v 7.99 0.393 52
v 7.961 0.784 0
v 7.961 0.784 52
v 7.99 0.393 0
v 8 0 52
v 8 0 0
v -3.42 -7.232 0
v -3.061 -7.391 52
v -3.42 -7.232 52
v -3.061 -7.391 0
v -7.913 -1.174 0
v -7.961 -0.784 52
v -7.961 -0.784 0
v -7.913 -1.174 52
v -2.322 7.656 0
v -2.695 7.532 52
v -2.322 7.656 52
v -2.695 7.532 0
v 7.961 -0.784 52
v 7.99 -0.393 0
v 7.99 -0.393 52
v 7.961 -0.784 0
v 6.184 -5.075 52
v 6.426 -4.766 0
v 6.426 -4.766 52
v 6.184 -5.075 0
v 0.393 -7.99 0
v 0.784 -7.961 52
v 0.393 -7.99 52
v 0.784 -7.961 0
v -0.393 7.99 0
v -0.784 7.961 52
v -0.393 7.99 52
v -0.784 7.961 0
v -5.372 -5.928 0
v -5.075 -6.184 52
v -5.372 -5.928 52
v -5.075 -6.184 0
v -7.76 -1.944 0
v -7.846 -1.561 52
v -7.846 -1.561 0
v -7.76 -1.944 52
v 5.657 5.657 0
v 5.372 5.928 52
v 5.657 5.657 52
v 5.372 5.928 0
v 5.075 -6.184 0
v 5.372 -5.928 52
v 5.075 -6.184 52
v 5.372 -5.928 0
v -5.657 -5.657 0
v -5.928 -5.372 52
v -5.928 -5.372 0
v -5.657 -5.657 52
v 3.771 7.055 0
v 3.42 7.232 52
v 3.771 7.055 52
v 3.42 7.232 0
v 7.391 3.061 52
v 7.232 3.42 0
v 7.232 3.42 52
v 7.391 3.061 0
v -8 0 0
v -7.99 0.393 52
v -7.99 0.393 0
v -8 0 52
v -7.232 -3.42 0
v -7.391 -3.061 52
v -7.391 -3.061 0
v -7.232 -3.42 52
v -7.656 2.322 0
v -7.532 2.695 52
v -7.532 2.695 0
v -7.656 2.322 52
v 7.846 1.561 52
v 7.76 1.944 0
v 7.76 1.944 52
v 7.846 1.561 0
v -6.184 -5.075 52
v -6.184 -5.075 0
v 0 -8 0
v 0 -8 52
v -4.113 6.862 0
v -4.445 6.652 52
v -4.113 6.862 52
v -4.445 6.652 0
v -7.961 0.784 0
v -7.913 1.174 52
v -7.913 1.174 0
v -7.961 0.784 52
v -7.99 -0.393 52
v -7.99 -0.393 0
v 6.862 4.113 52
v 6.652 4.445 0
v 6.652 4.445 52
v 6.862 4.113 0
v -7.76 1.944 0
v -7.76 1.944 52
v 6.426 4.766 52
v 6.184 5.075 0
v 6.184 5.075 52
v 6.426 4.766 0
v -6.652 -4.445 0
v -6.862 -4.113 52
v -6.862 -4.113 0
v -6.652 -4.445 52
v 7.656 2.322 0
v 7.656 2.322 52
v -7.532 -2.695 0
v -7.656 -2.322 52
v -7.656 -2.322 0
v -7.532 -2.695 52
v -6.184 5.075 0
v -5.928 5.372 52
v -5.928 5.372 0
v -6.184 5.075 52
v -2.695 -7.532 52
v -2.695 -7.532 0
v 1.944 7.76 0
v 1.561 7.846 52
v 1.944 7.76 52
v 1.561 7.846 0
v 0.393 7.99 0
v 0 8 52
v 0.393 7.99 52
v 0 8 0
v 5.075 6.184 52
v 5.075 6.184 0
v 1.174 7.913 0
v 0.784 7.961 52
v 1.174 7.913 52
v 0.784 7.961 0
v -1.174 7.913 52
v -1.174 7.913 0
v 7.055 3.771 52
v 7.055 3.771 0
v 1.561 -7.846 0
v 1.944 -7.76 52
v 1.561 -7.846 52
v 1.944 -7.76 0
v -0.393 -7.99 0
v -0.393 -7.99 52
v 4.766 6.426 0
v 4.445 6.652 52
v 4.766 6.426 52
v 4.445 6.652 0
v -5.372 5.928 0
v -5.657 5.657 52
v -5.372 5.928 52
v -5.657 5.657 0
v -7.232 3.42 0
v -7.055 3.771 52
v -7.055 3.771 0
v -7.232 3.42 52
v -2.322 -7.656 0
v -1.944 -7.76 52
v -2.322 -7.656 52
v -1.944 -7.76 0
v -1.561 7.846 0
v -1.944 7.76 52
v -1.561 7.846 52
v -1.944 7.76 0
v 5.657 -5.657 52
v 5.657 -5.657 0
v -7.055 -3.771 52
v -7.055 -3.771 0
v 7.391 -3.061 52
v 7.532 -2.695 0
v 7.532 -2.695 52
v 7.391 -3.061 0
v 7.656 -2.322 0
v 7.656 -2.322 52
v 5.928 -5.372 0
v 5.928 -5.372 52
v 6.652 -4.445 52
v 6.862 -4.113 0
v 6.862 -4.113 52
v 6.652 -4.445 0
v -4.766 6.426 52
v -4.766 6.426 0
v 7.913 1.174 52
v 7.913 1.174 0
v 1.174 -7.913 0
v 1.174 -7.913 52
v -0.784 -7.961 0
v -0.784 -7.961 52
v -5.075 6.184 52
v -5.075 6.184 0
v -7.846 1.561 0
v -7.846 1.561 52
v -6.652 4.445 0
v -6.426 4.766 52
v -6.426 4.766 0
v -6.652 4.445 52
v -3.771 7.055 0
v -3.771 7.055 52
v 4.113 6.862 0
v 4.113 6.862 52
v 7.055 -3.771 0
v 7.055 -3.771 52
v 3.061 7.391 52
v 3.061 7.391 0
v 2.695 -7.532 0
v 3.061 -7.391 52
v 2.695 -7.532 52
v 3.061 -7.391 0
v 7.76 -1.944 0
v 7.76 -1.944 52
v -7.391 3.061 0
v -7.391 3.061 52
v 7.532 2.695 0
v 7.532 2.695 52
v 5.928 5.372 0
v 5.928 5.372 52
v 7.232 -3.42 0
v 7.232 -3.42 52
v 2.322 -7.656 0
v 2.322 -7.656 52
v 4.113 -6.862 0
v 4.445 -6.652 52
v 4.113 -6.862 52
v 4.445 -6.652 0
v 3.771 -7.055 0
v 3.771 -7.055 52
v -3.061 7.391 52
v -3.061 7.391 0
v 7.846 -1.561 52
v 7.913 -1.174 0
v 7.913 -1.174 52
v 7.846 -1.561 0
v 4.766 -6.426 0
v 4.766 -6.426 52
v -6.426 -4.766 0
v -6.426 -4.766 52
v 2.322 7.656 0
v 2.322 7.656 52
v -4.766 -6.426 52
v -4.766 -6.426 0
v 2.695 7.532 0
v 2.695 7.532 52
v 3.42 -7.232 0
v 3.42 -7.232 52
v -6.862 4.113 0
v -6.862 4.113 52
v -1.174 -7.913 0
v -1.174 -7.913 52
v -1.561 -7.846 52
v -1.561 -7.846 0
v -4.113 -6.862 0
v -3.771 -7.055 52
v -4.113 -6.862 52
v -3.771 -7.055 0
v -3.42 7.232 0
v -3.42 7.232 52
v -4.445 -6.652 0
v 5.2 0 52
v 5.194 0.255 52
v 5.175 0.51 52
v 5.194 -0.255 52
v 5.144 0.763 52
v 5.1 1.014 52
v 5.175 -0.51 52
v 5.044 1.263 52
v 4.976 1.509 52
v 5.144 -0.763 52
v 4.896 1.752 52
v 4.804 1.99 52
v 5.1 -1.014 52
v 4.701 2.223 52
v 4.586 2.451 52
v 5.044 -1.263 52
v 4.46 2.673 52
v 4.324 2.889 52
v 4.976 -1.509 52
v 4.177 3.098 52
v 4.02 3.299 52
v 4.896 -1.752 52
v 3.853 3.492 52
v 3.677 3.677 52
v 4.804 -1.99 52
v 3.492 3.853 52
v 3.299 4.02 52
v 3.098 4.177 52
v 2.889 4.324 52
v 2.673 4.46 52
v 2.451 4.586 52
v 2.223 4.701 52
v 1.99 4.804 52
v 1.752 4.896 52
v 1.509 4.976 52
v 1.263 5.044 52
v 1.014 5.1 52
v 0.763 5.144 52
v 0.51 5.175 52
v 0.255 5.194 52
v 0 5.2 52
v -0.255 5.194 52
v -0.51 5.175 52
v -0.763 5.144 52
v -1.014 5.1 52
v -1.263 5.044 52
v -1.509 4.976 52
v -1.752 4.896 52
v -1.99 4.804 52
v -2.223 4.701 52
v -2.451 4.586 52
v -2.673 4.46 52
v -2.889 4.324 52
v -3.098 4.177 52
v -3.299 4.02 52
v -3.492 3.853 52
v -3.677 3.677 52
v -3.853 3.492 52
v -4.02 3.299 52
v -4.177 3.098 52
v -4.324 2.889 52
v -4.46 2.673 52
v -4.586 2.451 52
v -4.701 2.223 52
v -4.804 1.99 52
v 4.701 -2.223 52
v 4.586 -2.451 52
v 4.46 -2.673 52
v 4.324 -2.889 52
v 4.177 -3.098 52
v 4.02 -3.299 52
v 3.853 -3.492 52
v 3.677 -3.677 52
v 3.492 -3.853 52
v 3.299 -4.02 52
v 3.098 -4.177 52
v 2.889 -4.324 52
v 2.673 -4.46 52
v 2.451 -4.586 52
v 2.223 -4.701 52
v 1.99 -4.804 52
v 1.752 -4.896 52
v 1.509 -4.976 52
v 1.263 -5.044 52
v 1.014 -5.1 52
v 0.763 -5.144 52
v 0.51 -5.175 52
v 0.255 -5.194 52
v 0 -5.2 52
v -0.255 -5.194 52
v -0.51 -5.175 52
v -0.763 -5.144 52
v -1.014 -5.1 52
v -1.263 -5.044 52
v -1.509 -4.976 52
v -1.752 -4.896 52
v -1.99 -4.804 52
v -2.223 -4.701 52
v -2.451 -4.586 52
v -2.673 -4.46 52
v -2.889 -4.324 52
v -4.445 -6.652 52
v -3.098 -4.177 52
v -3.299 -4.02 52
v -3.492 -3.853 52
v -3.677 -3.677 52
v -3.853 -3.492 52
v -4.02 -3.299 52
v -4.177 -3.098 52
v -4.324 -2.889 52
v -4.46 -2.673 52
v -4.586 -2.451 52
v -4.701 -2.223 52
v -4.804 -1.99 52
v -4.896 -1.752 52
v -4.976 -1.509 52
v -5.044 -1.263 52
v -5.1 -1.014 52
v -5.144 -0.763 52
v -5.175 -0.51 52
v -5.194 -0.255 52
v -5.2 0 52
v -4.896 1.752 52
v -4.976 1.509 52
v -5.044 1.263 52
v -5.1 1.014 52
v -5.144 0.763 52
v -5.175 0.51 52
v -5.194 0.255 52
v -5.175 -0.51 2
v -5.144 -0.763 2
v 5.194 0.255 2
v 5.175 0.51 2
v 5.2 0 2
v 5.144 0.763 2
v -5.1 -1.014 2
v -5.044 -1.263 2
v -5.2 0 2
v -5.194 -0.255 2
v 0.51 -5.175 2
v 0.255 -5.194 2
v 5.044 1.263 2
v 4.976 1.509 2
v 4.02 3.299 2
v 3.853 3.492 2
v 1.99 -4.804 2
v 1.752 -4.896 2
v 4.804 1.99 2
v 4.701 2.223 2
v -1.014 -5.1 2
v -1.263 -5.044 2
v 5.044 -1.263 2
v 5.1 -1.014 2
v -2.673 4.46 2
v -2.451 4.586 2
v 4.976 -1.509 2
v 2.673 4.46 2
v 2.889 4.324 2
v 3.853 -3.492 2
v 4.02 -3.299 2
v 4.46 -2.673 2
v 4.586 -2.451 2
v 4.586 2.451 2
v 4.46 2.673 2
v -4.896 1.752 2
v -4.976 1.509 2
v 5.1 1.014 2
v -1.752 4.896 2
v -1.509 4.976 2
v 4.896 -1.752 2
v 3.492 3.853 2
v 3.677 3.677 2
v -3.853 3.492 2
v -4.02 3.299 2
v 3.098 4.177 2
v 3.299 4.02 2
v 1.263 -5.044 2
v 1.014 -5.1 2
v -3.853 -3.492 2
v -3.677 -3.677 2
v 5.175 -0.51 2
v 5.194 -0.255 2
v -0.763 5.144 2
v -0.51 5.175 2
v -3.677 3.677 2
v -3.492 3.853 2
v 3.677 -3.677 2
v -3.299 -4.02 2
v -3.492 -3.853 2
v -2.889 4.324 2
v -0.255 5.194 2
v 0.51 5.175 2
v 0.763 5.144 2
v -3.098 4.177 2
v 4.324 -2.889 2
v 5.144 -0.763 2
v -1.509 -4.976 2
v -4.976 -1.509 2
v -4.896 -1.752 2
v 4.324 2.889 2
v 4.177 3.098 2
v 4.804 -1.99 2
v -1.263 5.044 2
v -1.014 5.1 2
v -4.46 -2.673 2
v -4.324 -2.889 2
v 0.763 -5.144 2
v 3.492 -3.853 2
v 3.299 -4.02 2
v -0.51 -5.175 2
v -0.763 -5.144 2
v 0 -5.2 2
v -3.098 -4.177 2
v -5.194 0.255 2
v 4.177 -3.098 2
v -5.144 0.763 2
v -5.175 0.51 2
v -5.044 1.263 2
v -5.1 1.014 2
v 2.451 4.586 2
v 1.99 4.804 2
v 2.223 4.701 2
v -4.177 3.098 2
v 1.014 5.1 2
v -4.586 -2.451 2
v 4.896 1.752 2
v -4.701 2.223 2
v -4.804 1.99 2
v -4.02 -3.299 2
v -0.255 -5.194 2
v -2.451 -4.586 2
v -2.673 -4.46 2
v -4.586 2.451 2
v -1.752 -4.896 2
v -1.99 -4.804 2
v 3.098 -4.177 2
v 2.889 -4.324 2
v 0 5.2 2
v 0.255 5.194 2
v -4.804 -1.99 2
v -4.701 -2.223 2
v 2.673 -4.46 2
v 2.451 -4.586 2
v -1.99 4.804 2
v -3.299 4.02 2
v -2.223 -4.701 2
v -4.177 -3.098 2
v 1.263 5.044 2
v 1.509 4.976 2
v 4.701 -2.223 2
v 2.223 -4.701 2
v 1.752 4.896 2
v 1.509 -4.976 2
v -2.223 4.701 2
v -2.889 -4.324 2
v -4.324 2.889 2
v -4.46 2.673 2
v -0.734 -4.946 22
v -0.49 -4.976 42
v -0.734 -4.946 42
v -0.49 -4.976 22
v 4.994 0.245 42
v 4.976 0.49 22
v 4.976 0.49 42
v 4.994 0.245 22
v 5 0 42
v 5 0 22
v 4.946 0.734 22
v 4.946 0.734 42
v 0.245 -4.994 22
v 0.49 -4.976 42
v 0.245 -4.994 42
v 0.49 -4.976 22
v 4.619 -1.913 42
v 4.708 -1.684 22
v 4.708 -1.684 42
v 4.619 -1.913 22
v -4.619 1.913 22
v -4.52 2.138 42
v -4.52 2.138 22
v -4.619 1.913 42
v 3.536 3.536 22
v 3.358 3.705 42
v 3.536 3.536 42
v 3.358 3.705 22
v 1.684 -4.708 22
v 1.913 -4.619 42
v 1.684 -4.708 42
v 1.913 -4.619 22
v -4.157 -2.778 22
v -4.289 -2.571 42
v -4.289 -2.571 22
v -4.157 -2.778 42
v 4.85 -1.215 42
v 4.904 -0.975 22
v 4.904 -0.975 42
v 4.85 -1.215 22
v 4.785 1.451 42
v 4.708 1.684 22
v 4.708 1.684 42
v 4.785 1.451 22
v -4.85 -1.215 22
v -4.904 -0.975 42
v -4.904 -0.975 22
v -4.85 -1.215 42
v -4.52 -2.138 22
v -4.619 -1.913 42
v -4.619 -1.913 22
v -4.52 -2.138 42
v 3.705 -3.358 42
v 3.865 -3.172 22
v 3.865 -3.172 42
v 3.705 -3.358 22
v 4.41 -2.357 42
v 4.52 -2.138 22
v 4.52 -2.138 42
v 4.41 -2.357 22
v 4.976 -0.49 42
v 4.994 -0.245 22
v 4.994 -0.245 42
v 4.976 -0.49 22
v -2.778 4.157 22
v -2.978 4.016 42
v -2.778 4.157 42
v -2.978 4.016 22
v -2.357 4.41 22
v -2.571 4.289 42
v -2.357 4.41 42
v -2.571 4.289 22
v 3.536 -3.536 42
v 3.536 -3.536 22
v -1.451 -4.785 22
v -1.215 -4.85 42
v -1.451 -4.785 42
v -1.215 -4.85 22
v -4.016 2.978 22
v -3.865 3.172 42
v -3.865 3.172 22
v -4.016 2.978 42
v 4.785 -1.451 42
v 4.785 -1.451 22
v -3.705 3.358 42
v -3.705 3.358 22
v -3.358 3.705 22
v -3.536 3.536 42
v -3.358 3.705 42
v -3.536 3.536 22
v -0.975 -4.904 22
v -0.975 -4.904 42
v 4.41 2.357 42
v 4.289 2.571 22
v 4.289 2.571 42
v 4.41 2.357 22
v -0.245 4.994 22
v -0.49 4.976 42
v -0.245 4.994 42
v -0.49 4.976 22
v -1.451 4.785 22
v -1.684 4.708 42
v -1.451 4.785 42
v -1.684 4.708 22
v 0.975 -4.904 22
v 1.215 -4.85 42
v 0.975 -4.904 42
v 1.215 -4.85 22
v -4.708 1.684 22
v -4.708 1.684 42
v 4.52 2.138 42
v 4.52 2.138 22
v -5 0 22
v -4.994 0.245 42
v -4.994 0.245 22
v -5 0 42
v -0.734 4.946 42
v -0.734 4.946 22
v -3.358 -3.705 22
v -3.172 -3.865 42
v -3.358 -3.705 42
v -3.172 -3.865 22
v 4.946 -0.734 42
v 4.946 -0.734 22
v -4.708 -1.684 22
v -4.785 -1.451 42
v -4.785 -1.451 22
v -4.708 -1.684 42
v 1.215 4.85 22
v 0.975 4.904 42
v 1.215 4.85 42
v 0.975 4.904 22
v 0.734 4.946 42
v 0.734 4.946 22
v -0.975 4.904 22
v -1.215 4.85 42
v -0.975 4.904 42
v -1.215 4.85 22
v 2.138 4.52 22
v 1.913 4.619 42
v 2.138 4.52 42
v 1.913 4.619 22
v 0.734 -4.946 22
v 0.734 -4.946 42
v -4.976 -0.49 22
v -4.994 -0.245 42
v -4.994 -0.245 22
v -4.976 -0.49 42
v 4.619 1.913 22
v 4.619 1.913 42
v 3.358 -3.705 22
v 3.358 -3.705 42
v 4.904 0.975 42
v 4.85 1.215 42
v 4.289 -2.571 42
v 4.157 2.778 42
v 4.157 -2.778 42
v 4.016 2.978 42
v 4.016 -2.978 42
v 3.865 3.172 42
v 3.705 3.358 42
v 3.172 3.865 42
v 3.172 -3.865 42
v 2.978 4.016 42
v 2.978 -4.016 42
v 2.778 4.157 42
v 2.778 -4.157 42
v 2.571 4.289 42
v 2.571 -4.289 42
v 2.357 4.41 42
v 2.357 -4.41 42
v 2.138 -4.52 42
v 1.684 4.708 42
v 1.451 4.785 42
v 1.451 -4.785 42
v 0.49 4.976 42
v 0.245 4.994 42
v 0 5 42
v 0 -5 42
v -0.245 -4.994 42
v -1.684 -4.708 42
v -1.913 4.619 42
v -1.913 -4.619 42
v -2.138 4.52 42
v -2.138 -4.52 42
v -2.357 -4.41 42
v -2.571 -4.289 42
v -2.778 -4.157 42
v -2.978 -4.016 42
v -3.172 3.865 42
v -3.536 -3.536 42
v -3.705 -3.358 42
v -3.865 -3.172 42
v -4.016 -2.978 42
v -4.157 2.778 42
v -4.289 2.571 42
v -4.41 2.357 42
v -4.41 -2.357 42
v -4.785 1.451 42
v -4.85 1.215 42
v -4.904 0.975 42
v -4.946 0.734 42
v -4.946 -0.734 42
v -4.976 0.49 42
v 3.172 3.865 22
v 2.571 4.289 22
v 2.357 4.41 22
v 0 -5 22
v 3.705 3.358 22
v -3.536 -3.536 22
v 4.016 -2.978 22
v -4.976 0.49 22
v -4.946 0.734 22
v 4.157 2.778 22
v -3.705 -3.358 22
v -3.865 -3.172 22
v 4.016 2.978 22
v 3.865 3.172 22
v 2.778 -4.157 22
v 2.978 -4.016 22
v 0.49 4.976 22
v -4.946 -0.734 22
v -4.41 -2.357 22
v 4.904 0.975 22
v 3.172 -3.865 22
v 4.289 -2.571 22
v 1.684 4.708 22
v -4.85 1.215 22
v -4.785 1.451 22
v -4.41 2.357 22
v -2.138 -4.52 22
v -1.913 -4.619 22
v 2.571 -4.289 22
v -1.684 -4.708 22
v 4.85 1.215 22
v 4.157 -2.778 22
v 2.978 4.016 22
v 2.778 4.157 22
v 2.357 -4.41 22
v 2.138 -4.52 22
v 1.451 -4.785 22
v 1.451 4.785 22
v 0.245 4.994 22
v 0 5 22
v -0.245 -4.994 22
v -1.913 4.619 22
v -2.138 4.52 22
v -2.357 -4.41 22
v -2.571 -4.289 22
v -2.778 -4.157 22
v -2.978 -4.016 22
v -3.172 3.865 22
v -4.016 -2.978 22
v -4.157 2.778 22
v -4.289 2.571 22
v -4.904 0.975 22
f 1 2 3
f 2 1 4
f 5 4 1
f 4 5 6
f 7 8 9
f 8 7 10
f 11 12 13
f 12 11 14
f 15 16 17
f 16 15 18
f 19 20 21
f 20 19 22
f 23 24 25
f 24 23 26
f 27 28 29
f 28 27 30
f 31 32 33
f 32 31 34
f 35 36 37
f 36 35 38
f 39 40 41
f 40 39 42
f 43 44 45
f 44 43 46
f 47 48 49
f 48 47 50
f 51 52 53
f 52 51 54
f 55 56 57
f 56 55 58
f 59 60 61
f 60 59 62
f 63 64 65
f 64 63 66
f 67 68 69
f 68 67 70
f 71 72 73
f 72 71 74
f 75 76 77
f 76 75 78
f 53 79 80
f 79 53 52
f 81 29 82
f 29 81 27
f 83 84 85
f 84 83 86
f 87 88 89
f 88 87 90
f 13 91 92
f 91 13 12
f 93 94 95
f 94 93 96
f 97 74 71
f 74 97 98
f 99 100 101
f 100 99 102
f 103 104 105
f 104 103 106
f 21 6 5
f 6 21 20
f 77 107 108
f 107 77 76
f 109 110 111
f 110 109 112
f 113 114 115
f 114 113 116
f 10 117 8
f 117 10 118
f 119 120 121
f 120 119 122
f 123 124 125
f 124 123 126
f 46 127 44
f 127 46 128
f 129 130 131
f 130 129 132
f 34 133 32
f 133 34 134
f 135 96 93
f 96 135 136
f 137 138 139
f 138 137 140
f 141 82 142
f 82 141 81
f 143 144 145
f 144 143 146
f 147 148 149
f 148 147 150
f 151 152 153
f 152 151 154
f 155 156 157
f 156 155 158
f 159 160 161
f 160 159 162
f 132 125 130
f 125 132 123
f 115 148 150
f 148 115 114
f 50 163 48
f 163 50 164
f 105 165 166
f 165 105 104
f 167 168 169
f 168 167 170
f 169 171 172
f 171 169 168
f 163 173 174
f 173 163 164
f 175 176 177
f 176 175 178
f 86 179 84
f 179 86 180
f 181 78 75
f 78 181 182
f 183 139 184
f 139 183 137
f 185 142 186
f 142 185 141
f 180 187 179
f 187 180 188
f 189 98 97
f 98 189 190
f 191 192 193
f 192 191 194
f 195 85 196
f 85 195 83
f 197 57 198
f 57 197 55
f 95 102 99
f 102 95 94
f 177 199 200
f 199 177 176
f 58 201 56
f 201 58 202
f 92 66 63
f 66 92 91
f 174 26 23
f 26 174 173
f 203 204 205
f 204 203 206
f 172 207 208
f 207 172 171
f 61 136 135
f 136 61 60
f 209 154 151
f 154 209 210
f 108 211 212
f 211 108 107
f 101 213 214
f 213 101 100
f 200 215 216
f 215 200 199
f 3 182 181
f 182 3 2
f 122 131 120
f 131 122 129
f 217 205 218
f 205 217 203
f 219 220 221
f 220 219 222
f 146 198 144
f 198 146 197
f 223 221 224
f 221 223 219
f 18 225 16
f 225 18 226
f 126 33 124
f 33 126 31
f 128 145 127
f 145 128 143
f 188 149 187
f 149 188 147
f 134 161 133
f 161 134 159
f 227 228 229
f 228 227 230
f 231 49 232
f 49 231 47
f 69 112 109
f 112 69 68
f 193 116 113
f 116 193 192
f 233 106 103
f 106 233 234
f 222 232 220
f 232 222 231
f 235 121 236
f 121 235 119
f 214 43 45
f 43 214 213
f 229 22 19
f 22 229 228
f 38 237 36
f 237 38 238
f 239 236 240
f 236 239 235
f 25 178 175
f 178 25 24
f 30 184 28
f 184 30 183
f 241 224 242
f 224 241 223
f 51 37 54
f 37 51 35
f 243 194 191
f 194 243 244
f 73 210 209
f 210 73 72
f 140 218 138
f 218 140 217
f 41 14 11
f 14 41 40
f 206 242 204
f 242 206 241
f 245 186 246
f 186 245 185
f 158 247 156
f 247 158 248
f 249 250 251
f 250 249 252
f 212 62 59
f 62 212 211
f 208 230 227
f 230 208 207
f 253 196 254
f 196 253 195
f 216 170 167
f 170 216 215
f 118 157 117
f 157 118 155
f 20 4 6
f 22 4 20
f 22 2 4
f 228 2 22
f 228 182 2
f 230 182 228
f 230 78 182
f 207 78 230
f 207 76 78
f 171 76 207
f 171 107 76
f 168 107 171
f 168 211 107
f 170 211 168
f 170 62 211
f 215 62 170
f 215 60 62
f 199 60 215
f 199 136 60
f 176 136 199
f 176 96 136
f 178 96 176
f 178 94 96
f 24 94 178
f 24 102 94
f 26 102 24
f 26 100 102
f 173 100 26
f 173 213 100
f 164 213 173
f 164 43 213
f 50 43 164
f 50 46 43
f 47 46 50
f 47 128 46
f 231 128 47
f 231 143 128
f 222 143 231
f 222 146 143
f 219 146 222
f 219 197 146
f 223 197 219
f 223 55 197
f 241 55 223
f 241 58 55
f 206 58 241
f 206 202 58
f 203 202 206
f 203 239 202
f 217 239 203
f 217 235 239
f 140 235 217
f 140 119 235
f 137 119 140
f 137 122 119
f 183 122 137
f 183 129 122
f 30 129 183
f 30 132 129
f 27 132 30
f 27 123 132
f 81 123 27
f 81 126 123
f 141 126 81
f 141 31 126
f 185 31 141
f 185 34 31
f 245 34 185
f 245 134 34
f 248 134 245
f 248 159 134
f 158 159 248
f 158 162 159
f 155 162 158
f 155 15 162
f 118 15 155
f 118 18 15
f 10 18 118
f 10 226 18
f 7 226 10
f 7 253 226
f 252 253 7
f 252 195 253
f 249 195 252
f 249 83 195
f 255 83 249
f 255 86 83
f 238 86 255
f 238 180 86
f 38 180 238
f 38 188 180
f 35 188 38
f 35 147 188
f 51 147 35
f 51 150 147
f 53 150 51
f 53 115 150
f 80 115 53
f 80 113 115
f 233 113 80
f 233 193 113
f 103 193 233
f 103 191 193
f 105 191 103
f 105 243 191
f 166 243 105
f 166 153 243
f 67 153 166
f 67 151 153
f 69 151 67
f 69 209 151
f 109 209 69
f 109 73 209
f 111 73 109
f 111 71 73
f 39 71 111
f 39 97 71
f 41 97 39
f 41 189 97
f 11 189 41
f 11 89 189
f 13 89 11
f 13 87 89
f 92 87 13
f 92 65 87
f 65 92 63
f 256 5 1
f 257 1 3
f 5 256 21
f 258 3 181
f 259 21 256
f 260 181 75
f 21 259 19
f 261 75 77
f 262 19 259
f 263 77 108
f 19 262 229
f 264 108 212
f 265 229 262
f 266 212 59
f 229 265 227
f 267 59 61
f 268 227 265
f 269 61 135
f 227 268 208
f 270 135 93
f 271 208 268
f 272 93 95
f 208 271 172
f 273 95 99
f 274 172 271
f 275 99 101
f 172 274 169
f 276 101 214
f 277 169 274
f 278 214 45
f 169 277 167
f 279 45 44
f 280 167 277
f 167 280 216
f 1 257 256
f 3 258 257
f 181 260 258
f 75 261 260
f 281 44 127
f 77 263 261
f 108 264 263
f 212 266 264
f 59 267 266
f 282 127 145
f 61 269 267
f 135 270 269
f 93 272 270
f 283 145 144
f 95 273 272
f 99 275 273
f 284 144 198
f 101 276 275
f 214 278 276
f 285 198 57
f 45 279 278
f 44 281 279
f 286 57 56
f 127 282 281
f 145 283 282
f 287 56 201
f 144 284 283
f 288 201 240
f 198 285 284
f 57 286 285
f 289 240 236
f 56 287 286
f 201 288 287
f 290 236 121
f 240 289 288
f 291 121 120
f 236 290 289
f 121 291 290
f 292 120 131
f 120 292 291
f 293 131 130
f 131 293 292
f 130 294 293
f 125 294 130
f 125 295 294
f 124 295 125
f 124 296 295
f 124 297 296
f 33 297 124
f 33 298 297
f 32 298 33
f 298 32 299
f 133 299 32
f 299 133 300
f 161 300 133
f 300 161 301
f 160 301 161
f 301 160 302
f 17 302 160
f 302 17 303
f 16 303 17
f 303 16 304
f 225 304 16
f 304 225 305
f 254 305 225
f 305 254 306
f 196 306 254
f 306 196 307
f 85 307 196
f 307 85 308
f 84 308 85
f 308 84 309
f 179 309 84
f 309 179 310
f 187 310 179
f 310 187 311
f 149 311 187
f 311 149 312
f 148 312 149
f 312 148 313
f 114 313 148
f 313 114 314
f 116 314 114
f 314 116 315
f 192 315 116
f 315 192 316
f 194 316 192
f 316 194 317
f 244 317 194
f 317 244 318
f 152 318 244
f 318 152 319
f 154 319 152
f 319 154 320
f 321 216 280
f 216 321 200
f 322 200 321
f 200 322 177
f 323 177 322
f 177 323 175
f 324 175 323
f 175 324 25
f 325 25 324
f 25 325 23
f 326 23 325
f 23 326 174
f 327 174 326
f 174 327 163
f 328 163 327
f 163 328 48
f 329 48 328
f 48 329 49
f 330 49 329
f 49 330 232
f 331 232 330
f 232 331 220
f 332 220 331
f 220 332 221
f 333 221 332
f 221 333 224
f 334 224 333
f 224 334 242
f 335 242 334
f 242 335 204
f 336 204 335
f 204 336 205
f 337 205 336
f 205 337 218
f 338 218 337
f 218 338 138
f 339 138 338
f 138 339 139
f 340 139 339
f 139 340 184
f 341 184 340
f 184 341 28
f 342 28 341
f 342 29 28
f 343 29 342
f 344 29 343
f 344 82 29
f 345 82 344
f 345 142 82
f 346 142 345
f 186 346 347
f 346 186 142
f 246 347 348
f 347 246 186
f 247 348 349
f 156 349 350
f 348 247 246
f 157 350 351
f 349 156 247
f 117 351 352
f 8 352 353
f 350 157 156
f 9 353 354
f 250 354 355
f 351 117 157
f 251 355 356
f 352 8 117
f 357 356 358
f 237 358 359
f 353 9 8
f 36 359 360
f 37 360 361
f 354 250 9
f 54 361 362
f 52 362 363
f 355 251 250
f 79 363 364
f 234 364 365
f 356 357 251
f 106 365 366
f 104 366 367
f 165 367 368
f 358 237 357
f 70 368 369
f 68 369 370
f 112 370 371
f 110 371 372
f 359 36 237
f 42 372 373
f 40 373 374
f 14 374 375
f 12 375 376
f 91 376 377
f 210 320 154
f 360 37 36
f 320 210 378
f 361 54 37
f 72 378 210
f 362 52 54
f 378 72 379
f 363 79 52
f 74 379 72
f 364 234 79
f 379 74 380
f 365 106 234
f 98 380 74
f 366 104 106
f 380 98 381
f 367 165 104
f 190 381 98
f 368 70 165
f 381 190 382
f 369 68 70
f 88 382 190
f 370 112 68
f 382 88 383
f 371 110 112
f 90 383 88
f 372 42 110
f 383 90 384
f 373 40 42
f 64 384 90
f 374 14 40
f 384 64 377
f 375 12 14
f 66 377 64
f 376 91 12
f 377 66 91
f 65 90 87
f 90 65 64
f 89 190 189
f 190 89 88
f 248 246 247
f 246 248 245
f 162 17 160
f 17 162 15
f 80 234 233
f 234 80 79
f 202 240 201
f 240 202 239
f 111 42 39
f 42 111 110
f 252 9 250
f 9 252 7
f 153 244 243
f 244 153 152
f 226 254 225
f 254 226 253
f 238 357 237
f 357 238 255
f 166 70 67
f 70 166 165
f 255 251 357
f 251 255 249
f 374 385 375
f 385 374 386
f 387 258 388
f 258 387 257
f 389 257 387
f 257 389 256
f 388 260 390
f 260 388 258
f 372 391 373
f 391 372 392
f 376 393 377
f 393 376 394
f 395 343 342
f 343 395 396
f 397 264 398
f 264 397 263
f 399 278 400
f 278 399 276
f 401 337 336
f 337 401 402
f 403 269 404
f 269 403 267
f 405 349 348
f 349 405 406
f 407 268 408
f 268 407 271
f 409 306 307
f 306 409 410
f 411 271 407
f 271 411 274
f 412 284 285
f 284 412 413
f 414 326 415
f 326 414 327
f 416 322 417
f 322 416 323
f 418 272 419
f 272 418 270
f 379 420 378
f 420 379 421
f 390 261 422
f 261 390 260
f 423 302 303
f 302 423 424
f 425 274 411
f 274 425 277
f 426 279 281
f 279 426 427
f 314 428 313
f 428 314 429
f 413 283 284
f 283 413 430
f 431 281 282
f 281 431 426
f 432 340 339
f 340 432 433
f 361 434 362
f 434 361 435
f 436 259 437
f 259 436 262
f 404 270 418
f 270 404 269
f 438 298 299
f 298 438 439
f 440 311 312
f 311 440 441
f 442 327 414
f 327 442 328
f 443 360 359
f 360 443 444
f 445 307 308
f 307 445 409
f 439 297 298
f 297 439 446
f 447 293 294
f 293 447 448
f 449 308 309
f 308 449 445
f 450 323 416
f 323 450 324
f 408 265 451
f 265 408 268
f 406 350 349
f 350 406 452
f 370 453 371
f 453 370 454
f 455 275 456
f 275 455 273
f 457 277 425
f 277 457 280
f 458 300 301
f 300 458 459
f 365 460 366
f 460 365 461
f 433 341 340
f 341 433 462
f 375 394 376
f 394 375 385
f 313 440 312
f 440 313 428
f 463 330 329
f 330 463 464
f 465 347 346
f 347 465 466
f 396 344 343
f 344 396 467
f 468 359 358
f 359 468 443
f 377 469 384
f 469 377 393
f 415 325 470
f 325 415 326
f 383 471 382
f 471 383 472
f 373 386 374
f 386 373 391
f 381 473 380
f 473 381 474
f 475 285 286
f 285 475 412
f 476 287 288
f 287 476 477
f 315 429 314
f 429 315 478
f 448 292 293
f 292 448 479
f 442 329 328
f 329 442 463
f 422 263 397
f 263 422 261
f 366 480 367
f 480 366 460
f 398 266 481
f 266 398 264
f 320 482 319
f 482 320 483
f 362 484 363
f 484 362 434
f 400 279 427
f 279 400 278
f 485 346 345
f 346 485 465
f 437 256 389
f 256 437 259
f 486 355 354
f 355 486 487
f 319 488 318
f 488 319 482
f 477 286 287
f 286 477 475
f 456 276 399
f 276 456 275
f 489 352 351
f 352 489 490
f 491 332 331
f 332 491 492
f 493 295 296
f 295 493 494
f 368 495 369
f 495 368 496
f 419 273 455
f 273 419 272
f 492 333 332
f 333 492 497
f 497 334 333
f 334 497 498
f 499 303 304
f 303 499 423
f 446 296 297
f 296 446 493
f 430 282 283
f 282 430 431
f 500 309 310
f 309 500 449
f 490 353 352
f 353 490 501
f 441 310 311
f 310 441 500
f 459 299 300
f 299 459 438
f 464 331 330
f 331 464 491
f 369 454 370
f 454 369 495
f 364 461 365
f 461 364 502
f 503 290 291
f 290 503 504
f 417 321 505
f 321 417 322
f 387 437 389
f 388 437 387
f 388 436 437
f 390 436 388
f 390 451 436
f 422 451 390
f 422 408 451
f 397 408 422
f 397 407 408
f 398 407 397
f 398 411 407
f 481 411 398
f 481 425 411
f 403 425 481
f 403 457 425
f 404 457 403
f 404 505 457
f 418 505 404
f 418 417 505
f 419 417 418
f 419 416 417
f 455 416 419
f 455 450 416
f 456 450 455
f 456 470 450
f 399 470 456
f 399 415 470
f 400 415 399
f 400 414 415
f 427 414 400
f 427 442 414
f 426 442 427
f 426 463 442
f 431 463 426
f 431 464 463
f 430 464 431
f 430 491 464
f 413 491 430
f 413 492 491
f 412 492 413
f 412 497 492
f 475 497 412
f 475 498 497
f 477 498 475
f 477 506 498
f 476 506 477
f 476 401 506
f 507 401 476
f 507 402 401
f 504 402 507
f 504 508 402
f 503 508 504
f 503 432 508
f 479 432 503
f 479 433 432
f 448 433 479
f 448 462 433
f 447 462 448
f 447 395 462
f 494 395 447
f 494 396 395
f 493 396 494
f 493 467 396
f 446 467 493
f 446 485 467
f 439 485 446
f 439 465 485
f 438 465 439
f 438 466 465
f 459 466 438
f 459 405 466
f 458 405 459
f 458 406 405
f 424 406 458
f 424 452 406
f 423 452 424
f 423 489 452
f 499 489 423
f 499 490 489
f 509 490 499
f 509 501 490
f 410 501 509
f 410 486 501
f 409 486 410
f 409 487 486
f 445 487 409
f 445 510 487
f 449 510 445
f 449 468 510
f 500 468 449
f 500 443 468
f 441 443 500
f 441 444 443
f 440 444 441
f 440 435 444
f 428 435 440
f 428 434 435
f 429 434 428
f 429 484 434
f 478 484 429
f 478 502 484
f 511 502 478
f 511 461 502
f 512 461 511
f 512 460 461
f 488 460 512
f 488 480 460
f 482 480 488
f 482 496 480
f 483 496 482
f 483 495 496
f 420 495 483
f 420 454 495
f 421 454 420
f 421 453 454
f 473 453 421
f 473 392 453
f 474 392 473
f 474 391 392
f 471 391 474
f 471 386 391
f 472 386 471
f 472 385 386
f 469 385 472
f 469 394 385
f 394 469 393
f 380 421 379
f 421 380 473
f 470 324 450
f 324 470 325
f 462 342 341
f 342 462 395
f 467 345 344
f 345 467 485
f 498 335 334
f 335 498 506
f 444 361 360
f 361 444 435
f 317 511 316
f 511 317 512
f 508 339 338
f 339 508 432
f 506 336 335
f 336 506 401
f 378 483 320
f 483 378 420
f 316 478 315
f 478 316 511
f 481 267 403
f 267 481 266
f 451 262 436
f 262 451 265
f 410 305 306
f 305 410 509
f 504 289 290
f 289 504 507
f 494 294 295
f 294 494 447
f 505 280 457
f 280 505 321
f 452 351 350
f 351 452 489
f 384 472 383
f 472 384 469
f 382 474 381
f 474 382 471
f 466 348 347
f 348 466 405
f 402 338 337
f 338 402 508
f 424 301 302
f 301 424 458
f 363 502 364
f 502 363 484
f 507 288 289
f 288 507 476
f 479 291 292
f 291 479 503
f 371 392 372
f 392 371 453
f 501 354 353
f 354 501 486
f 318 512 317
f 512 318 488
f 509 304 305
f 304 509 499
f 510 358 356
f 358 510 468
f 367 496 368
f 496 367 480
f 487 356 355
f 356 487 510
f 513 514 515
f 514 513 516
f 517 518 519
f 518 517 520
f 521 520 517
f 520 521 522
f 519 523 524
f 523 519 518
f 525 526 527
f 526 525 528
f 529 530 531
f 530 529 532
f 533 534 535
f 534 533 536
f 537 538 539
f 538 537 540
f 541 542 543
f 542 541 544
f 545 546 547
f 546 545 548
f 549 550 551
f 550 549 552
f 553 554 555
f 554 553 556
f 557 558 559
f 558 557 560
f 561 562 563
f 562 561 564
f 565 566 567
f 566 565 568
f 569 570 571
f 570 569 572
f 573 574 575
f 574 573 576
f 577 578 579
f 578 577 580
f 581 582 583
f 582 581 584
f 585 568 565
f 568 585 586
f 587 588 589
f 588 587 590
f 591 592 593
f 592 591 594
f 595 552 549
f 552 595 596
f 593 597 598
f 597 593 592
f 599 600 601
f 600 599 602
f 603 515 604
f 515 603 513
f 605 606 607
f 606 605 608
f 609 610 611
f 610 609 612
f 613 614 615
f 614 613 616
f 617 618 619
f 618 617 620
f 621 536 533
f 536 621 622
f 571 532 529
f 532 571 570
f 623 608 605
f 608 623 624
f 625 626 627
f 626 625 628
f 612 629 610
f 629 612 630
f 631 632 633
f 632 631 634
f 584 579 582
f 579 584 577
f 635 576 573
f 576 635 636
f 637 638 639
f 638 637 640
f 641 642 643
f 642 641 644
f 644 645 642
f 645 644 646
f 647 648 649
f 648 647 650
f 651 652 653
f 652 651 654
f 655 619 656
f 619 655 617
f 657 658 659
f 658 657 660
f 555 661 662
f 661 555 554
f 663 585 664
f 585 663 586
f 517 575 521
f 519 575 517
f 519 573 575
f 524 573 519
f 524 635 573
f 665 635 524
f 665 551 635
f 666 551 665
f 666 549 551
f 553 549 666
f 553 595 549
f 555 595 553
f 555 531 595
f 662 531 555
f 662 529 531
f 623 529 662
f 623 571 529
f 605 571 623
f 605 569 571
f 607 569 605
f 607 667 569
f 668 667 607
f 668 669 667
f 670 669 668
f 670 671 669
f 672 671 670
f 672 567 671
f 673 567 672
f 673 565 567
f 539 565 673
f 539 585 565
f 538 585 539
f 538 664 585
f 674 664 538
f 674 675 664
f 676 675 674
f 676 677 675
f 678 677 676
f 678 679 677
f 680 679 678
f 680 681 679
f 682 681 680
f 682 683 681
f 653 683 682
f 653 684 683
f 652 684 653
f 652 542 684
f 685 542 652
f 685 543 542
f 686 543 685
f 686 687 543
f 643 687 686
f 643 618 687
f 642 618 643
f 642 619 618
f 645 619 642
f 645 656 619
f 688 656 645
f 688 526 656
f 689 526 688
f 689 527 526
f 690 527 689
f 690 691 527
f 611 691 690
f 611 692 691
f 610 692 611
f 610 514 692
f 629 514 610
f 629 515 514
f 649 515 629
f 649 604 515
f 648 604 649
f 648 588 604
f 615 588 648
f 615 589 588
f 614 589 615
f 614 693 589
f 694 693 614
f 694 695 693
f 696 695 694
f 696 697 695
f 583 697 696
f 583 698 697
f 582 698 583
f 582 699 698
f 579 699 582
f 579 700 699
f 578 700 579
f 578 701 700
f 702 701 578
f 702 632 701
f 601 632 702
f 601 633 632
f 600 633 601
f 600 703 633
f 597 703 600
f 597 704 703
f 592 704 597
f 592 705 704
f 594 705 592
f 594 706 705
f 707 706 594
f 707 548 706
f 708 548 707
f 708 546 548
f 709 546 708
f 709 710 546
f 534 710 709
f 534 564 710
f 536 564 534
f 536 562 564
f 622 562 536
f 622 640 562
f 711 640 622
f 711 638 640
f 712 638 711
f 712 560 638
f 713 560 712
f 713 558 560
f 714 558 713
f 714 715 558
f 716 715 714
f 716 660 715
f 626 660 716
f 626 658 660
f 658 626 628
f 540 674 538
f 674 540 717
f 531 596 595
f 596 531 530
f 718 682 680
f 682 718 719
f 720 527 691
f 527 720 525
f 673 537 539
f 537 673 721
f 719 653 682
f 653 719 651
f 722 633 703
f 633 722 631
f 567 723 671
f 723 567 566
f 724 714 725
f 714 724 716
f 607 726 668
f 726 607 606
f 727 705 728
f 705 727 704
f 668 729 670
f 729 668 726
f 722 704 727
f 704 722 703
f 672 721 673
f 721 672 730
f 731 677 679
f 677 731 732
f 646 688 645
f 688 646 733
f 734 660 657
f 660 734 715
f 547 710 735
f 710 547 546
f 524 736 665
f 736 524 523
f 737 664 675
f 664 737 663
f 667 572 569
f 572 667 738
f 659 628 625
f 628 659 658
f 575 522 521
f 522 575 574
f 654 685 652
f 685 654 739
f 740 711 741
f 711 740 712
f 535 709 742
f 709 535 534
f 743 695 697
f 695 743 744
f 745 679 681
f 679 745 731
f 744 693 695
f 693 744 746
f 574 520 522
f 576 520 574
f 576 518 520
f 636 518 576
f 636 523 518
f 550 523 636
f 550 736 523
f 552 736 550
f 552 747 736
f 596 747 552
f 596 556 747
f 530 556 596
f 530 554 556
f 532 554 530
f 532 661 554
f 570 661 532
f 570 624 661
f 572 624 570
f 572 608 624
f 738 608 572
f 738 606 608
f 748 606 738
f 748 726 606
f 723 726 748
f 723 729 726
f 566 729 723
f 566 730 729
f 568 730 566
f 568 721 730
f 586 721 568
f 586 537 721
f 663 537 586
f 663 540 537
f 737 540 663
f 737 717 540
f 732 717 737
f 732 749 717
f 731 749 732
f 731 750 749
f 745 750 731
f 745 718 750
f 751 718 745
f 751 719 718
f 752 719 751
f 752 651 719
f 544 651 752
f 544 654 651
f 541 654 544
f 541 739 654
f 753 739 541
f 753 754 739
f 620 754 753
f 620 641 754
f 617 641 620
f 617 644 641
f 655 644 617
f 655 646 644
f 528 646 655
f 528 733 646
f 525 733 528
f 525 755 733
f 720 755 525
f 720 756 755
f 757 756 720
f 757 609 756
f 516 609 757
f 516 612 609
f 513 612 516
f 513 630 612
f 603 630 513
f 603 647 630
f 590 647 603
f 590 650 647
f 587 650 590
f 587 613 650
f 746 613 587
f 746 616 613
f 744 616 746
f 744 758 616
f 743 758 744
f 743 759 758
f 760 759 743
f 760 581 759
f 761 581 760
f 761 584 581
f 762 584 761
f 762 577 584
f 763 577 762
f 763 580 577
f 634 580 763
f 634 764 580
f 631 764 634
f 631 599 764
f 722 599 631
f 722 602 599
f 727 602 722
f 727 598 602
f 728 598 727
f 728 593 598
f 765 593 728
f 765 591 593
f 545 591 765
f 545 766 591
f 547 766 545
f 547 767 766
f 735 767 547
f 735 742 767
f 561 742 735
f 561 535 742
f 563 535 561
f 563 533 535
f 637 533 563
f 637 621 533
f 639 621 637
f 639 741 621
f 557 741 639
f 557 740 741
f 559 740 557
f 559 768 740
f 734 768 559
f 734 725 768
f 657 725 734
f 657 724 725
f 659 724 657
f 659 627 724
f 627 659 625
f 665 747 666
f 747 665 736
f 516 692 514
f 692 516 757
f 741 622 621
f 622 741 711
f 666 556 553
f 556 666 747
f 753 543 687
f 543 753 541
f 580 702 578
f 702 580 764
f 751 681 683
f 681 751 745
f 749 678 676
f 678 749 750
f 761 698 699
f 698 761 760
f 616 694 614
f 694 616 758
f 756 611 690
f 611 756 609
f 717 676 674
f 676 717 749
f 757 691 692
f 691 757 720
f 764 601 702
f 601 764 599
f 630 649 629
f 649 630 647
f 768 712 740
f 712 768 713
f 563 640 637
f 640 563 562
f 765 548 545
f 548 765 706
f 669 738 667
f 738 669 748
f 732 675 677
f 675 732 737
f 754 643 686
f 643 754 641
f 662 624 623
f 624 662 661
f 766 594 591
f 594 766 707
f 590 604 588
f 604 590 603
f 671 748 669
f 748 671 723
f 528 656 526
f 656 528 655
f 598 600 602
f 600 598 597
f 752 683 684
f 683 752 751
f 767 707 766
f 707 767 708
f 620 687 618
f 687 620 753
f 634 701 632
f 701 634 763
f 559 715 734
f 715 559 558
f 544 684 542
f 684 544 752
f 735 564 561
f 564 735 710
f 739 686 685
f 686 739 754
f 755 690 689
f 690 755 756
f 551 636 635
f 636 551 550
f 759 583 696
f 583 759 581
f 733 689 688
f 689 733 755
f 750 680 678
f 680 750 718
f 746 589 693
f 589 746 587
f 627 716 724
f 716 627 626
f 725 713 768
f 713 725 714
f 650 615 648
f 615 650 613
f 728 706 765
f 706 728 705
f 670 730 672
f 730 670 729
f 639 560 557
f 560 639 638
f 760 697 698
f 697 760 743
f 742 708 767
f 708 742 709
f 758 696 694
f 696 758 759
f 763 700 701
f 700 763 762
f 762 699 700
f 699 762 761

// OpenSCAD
agentscad_part = "all";
piston_stroke = 0;

$fn = 128;

module barrel() {
    difference() {
        cylinder(h = 52, r = 8, center = false);
        translate([0, 0, 2])
            cylinder(h = 51, r = 5.2, center = false);
    }
}

module piston() {
    translate([0, 0, 22 + piston_stroke])
        cylinder(h = 20, r = 5, center = false);
}

if (agentscad_part == "all" || agentscad_part == "barrel") barrel();
if (agentscad_part == "all" || agentscad_part == "piston") piston();
